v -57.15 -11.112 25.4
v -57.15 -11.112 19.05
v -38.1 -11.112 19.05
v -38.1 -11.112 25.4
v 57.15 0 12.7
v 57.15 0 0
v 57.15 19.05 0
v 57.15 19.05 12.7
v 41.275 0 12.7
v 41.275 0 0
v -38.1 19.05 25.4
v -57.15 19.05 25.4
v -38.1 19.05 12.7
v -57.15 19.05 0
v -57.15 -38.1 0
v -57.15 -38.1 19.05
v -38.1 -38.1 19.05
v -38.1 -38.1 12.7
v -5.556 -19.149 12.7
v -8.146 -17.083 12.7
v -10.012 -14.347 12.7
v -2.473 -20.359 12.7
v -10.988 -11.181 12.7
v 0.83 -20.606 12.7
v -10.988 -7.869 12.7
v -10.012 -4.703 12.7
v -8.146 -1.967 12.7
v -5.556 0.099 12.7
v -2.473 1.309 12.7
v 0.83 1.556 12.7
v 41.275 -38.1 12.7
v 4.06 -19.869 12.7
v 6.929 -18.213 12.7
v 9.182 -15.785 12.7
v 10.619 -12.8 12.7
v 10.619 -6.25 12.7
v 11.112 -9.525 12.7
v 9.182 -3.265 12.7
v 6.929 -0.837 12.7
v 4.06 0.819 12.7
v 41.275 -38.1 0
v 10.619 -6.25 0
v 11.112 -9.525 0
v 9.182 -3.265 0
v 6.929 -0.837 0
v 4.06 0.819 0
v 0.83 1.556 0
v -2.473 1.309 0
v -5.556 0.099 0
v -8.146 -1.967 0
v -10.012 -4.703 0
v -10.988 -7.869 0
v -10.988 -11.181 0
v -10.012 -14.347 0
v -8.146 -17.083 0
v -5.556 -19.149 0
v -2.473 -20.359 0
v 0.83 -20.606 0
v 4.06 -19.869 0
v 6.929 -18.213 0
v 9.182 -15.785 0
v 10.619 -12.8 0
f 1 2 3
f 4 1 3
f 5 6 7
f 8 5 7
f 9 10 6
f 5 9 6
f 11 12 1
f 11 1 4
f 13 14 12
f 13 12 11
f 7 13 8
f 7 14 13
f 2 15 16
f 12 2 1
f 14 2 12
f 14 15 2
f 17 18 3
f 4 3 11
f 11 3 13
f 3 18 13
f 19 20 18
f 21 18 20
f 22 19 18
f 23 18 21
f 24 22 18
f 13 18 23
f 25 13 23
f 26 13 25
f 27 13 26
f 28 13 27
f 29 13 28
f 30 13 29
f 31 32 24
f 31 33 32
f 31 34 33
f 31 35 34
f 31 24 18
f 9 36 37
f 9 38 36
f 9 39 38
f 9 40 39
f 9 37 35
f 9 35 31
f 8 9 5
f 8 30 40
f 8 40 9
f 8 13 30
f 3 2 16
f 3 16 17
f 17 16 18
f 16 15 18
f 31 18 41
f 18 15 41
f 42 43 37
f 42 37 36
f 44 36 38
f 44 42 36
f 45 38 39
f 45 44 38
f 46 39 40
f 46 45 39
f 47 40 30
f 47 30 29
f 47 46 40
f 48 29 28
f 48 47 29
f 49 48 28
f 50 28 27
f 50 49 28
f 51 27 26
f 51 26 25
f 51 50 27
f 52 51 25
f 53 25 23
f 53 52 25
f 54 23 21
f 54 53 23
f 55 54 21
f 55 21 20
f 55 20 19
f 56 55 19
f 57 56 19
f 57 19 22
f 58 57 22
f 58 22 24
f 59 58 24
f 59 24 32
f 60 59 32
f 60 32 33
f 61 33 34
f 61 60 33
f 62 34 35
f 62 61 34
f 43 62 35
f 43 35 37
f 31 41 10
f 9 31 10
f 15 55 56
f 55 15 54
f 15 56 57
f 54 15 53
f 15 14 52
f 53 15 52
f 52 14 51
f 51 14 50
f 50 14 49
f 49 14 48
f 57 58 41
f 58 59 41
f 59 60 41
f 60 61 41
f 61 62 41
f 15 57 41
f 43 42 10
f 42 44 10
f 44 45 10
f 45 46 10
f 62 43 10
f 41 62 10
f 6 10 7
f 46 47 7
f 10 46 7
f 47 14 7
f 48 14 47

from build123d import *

# Parameters (mm, degrees)
F0_W     = 19.05
F0_H     = 30.1625
F0_R     = 11.1125
F0_H_2   = 26.9875
F1_DEPTH = 12.7
F2_W     = 19.05
F2_H     = 26.9875
F3_DEPTH = 6.35
F2_H_2   = 30.1625
F4_DEPTH = 12.7


with BuildPart() as f1:
    # F0 (on Top) → F1 (new body)
    with BuildSketch(Plane.XY):
        with Locations((-47.625, 3.96875)):
            Rectangle(F0_W, F0_H)
        Polygon((0, 19.05), (-38.1, 19.05), (-38.1, -11.1125), (-38.1, -38.1), (41.275, -38.1), (41.275, 0), (57.15, 0), (57.15, 19.05), align=None)
        with Locations((0, -9.525)):
            Circle(F0_R, mode=Mode.SUBTRACT)
        with Locations((-47.625, -24.60625)):
            Rectangle(F0_W, F0_H_2)
    extrude(amount=F1_DEPTH)

    # F2 (on face) → F3 (join)
    with BuildSketch(Plane.XY.offset(12.7)):
        with Locations((-47.625, -24.60625)):
            Rectangle(F2_W, F2_H)
    extrude(amount=F3_DEPTH)

    # F2 (on face) → F4 (join)
    with BuildSketch(Plane.XY.offset(12.7)):
        with Locations((-47.625, 3.96875)):
            Rectangle(F2_W, F2_H_2)
    extrude(amount=F4_DEPTH)


solid = f1.part
